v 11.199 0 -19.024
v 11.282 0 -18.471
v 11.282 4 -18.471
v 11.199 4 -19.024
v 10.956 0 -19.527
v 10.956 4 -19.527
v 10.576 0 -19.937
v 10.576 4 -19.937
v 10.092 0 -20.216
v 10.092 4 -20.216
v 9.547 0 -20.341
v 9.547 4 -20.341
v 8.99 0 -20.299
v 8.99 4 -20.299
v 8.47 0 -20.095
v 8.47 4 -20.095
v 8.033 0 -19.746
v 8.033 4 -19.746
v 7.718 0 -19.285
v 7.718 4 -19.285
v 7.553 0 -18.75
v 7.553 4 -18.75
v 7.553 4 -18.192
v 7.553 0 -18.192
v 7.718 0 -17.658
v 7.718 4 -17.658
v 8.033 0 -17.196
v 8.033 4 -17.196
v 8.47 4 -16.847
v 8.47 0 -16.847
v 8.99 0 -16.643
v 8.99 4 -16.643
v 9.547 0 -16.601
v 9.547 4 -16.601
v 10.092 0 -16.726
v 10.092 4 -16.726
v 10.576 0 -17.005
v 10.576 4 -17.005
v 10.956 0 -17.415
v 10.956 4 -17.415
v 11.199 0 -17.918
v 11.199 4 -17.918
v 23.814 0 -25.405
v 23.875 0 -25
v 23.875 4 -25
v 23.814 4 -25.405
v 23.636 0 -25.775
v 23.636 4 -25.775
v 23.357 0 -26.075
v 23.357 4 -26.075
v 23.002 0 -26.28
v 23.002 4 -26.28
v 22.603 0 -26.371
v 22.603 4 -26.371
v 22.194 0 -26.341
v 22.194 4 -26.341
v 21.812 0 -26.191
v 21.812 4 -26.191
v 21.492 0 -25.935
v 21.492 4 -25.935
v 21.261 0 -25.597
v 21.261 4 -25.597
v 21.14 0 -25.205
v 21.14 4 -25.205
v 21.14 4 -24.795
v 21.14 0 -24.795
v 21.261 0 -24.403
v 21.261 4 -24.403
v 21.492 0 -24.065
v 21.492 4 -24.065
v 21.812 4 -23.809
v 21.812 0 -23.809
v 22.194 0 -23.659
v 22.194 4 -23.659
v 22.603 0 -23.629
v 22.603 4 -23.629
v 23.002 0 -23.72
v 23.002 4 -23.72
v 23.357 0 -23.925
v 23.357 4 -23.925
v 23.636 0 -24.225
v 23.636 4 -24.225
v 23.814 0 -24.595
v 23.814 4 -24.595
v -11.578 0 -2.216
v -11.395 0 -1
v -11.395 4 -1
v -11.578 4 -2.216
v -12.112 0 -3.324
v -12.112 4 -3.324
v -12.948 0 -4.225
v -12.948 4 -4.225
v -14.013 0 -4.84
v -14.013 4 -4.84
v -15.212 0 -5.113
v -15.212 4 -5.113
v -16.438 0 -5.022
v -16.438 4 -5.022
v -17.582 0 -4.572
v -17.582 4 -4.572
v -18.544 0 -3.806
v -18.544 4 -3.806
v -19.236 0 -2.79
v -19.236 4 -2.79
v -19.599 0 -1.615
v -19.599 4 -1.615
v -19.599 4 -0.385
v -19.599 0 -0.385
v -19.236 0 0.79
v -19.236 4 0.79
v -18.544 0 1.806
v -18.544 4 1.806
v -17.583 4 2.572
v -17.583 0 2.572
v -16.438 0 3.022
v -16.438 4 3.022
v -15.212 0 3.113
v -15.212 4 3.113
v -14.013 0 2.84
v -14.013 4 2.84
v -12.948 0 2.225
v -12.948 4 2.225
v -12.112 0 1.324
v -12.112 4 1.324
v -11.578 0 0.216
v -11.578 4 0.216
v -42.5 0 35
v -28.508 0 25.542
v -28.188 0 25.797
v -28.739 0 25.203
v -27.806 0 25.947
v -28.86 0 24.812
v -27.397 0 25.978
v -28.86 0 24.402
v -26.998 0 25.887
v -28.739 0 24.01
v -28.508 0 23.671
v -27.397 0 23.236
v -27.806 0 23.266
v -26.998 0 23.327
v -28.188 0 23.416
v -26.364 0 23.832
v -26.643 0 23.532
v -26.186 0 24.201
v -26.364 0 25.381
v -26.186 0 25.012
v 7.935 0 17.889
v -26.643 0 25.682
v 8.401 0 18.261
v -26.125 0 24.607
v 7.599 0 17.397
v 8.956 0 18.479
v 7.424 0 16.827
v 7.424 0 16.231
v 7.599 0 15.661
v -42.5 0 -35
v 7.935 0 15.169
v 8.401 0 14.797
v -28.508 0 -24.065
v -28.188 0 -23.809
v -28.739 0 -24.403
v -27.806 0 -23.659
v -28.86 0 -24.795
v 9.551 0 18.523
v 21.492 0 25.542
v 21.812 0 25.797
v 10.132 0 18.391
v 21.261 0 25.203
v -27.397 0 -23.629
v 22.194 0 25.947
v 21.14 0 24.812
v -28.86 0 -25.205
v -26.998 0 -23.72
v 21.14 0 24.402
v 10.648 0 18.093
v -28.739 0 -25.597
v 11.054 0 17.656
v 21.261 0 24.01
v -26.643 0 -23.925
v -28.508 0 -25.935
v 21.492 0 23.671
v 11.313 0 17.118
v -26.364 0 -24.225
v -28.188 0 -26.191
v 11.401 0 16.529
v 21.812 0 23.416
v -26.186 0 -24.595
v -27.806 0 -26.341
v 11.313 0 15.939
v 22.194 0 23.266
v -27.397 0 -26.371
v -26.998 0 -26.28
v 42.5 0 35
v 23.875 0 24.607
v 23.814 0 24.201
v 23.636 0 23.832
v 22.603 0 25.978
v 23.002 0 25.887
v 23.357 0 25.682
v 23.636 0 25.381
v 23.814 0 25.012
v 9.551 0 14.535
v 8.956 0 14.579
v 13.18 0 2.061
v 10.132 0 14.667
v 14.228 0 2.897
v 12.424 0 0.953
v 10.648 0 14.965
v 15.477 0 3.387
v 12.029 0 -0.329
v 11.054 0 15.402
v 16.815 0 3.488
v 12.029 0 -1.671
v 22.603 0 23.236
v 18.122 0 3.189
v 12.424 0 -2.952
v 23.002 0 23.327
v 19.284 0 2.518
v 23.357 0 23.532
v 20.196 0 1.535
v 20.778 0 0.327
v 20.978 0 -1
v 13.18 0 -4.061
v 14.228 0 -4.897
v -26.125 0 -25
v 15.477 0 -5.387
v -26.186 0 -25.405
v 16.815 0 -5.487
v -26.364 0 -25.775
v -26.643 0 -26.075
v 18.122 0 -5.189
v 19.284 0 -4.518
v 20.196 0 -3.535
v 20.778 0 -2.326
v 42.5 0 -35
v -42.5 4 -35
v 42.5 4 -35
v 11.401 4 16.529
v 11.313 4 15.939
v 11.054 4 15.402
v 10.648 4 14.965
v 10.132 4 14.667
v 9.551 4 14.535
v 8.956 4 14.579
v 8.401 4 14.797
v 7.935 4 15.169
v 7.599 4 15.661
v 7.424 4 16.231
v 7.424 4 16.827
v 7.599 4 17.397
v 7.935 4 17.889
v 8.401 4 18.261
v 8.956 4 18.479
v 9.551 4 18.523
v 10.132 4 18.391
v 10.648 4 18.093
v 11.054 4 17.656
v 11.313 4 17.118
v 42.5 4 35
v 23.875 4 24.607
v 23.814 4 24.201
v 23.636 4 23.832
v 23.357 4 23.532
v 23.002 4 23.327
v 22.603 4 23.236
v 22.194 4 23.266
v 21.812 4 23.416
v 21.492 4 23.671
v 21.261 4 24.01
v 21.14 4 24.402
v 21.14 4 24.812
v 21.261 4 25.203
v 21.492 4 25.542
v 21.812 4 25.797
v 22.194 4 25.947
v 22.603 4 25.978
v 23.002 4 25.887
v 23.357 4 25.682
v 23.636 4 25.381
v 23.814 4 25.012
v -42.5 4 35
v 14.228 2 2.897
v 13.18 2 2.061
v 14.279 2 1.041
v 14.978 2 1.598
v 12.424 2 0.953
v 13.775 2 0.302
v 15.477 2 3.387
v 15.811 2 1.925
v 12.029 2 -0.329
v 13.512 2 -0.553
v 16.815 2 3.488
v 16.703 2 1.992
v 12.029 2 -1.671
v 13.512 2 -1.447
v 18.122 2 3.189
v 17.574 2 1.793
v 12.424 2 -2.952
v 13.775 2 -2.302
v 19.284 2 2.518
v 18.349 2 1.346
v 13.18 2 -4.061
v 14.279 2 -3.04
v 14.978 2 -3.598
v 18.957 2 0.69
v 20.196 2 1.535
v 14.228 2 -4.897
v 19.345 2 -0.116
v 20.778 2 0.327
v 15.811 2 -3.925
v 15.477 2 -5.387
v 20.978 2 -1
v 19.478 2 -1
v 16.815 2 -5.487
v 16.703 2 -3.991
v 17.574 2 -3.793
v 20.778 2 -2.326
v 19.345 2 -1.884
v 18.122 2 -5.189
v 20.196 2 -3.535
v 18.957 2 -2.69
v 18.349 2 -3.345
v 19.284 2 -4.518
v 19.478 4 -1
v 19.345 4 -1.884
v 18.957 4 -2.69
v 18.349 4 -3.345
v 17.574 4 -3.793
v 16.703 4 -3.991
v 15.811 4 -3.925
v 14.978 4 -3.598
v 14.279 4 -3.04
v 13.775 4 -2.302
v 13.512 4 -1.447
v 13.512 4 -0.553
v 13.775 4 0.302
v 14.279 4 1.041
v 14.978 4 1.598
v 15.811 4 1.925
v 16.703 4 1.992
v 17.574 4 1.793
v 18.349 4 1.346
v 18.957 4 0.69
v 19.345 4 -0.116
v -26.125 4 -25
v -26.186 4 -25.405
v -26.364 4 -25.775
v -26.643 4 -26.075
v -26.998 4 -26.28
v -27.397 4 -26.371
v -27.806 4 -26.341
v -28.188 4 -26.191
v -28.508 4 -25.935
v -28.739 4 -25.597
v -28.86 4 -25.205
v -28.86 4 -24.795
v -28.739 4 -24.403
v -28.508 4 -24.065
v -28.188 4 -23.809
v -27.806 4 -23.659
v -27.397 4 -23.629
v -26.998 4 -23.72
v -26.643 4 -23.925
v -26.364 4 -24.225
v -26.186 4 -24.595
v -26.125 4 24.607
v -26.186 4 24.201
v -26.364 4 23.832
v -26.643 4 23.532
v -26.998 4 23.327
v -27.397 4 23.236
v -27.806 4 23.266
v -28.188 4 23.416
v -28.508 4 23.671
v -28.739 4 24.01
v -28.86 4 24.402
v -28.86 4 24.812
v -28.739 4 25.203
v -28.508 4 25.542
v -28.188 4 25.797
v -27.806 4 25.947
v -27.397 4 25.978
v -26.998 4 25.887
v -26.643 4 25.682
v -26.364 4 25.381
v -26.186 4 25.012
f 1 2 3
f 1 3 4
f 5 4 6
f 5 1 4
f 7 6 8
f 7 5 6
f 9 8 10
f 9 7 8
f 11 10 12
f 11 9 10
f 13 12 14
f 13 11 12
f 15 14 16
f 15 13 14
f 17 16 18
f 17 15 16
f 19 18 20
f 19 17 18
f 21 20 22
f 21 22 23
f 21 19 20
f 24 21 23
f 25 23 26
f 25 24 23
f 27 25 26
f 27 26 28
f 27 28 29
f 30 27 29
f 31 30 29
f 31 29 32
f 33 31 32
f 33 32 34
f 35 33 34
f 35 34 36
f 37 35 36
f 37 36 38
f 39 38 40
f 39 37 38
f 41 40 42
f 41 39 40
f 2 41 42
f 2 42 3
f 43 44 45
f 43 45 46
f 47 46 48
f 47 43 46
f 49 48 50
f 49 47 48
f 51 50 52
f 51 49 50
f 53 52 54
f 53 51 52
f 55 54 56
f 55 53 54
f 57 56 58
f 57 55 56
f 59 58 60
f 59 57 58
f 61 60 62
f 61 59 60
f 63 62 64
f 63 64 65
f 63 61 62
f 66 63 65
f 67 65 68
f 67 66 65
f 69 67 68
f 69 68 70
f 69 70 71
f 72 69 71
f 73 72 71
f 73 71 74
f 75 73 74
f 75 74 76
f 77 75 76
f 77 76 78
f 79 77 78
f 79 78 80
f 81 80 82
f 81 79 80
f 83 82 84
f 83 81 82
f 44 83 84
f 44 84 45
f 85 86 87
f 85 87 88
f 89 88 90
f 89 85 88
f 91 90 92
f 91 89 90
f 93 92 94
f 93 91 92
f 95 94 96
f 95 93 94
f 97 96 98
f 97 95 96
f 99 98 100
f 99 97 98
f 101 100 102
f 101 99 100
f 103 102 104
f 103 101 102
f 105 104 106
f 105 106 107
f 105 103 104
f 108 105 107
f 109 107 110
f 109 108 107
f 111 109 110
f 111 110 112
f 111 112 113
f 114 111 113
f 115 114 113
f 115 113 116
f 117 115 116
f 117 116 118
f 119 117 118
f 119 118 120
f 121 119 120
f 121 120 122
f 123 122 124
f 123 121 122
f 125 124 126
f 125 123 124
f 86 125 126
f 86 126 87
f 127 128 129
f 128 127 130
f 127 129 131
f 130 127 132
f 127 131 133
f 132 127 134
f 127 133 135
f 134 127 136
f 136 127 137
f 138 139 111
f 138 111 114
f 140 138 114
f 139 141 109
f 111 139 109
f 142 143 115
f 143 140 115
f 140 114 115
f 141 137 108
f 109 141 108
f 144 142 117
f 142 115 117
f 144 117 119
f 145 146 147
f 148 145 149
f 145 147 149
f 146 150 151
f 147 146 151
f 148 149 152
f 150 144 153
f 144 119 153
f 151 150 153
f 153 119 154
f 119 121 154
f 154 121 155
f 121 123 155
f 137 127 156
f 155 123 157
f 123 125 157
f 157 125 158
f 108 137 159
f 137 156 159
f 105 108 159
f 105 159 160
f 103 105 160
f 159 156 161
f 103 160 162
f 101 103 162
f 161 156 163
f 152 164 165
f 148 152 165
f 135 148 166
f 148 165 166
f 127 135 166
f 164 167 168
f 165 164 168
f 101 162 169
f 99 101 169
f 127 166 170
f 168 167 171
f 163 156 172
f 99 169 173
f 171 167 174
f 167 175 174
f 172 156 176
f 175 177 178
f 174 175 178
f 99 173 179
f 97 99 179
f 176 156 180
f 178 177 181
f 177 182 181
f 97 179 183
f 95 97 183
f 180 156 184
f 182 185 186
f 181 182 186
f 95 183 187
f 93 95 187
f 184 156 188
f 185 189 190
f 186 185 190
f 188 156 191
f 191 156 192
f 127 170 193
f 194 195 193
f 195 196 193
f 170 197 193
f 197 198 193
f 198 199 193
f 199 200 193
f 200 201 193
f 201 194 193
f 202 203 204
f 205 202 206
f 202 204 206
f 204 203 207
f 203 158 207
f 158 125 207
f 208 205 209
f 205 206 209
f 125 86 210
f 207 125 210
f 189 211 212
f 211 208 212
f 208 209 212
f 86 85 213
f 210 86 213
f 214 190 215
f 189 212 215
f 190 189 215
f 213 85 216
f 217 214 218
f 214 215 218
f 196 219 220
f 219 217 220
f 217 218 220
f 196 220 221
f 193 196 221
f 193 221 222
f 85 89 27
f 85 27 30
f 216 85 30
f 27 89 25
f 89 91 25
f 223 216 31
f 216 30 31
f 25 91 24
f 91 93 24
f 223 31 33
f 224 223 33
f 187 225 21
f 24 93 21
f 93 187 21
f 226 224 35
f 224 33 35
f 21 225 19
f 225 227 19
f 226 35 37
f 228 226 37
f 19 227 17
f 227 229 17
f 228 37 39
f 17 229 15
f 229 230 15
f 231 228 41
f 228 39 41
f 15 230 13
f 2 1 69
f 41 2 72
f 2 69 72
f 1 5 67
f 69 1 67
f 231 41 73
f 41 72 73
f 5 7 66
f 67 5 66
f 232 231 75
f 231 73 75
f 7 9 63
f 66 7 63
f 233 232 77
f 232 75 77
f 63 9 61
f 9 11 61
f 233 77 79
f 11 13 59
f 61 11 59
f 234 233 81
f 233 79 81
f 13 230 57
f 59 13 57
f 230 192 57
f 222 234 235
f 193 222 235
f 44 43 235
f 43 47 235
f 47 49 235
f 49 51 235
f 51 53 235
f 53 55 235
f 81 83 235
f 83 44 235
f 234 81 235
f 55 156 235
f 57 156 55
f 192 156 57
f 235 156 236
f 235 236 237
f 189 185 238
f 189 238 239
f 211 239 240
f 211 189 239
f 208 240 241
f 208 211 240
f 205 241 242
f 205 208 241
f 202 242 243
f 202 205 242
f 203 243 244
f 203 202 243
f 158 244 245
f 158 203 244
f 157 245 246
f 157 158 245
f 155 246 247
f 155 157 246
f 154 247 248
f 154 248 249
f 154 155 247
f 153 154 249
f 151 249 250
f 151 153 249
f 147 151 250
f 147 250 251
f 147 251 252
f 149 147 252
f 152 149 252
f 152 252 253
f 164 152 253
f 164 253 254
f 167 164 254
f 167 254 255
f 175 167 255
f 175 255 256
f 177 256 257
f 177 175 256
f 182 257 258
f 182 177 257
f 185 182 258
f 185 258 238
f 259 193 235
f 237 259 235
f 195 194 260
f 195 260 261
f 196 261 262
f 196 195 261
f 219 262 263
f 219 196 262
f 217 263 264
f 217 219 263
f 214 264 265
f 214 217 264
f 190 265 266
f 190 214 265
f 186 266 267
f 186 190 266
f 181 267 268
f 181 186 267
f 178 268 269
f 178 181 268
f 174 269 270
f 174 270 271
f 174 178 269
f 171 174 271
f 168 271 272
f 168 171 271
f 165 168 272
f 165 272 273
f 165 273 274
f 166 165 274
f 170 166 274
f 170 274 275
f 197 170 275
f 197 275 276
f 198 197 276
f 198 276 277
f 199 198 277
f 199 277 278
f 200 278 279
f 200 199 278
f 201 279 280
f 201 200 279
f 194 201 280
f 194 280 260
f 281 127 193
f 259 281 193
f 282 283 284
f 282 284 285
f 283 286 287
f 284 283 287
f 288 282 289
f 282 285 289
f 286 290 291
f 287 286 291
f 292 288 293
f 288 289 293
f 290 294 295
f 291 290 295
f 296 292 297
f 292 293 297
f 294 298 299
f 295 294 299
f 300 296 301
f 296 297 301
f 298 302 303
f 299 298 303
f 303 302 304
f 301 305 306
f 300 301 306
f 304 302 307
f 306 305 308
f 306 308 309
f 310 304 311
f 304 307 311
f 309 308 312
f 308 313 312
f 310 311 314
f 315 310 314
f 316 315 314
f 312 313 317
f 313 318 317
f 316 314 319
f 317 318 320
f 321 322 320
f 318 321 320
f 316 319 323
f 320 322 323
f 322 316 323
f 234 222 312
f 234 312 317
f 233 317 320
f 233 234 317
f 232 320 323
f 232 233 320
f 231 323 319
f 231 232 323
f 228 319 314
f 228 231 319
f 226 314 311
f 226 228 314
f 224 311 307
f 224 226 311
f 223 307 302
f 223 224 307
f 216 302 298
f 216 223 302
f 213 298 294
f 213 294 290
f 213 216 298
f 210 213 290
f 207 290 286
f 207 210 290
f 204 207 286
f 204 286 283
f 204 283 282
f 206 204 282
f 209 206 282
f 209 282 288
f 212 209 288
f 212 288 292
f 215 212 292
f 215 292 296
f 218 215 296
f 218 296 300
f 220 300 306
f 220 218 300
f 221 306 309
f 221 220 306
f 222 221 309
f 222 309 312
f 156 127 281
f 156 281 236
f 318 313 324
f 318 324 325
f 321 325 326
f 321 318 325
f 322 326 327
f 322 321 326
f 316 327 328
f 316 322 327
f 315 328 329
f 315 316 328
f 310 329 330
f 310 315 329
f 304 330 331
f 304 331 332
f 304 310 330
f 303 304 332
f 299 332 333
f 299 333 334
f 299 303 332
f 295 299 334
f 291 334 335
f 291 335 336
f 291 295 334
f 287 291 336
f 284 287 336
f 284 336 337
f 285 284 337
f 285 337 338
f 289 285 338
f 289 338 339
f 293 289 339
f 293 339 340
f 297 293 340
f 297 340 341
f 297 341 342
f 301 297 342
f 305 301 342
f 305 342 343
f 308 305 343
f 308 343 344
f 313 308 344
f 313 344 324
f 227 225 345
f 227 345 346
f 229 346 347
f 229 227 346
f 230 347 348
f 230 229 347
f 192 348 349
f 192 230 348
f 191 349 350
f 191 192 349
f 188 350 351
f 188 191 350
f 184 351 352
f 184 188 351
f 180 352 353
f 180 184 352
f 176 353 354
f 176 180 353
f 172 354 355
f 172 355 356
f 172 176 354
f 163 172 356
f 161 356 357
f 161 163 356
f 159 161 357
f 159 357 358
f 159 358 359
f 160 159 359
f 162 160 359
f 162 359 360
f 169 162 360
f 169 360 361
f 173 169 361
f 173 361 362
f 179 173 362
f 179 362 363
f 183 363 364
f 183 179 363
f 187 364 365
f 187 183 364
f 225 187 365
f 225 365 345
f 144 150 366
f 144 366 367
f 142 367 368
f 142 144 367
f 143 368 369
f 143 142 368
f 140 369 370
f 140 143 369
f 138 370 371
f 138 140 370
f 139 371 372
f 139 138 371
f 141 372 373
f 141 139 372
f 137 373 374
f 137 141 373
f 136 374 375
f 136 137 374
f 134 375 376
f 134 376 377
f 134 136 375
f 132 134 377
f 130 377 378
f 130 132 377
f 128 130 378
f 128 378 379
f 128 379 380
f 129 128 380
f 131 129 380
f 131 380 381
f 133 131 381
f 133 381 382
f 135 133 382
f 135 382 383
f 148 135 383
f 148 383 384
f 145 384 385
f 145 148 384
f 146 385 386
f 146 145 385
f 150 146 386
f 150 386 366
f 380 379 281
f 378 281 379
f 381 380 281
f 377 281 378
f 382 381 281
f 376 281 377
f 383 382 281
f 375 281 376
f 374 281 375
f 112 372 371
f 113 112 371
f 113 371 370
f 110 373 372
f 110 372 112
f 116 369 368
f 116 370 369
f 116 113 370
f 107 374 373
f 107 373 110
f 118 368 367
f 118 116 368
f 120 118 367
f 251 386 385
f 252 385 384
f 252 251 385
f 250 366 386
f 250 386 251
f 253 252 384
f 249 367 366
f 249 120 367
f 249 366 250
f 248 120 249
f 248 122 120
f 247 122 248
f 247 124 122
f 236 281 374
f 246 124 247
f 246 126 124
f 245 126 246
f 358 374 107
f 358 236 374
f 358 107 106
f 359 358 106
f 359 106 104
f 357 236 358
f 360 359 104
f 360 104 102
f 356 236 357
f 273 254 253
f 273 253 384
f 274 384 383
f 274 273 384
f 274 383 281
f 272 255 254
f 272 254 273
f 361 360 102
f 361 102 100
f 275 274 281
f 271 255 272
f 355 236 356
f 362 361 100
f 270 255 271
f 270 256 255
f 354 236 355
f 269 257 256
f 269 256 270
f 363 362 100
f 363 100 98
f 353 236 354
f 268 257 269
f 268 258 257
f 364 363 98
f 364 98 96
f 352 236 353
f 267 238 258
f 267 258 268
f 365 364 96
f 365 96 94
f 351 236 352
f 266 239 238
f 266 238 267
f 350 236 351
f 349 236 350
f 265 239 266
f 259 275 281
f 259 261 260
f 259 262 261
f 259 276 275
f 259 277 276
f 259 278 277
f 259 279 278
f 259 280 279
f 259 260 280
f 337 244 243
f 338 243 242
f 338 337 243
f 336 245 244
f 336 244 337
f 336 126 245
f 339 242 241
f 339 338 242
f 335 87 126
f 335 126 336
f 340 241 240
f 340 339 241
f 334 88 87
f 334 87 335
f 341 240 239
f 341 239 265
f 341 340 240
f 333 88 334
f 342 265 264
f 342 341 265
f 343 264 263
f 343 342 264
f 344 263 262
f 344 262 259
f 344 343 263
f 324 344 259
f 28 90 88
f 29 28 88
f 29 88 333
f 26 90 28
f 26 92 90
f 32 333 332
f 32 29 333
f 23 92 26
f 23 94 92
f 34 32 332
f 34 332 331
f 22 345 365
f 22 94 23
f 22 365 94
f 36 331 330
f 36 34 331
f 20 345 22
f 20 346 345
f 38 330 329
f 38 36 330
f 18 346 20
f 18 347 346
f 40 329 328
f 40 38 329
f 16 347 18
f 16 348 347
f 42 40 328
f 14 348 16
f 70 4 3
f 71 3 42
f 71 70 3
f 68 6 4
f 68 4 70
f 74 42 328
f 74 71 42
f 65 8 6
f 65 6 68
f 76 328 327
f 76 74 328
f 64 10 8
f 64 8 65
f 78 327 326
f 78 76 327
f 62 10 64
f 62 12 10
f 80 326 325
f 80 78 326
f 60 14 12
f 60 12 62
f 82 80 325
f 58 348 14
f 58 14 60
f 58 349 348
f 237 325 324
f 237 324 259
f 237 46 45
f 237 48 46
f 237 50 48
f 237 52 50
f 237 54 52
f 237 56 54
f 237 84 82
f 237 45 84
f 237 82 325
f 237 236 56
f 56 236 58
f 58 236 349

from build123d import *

# Parameters (mm, degrees)
SKETCH1_W           = 85
SKETCH1_H           = 70
SKETCH1_R           = 1.375
SKETCH1_R_2         = 2
SKETCH1_R_3         = 1.875
SKETCH1_R_4         = 4.125
SKETCH1_R_5         = 3
BOSS_EXTRUDE4_DEPTH = 4
SKETCH1_7_R         = 4.5
CUT_EXTRUDE2_DEPTH  = 2


with BuildPart() as part:
    # Sketch1 → Boss-Extrude4 (new body)
    with BuildSketch(Plane(origin=(0, 0, 0), x_dir=(1, 0, 0), z_dir=(0, 1, 0))):
        Rectangle(SKETCH1_W, SKETCH1_H)
        with Locations((-27.5, -24.60667729)):
            Circle(SKETCH1_R, mode=Mode.SUBTRACT)
        with Locations((22.5, -24.60667729)):
            Circle(SKETCH1_R, mode=Mode.SUBTRACT)
        with Locations((9.401398241, -16.528956449)):
            Circle(SKETCH1_R_2, mode=Mode.SUBTRACT)
        with Locations((-27.5, 25)):
            Circle(SKETCH1_R, mode=Mode.SUBTRACT)
        with Locations((9.407211052, 18.471043068)):
            Circle(SKETCH1_R_3, mode=Mode.SUBTRACT)
        with Locations((22.5, 25)):
            Circle(SKETCH1_R, mode=Mode.SUBTRACT)
        with Locations((-15.52, 1)):
            Circle(SKETCH1_R_4, mode=Mode.SUBTRACT)
        with Locations((16.478339488, 0.999882702)):
            Circle(SKETCH1_R_5, mode=Mode.SUBTRACT)
    extrude(amount=BOSS_EXTRUDE4_DEPTH)

    # Sketch1<7> → Cut-Extrude2 (cut)
    with BuildSketch(Plane(origin=(0, 0, 0), x_dir=(1, 0, 0), z_dir=(0, 1, 0))):
        with Locations((16.478339488, 0.999882702)):
            Circle(SKETCH1_7_R)
    extrude(amount=CUT_EXTRUDE2_DEPTH, mode=Mode.SUBTRACT)


solid = part.part
